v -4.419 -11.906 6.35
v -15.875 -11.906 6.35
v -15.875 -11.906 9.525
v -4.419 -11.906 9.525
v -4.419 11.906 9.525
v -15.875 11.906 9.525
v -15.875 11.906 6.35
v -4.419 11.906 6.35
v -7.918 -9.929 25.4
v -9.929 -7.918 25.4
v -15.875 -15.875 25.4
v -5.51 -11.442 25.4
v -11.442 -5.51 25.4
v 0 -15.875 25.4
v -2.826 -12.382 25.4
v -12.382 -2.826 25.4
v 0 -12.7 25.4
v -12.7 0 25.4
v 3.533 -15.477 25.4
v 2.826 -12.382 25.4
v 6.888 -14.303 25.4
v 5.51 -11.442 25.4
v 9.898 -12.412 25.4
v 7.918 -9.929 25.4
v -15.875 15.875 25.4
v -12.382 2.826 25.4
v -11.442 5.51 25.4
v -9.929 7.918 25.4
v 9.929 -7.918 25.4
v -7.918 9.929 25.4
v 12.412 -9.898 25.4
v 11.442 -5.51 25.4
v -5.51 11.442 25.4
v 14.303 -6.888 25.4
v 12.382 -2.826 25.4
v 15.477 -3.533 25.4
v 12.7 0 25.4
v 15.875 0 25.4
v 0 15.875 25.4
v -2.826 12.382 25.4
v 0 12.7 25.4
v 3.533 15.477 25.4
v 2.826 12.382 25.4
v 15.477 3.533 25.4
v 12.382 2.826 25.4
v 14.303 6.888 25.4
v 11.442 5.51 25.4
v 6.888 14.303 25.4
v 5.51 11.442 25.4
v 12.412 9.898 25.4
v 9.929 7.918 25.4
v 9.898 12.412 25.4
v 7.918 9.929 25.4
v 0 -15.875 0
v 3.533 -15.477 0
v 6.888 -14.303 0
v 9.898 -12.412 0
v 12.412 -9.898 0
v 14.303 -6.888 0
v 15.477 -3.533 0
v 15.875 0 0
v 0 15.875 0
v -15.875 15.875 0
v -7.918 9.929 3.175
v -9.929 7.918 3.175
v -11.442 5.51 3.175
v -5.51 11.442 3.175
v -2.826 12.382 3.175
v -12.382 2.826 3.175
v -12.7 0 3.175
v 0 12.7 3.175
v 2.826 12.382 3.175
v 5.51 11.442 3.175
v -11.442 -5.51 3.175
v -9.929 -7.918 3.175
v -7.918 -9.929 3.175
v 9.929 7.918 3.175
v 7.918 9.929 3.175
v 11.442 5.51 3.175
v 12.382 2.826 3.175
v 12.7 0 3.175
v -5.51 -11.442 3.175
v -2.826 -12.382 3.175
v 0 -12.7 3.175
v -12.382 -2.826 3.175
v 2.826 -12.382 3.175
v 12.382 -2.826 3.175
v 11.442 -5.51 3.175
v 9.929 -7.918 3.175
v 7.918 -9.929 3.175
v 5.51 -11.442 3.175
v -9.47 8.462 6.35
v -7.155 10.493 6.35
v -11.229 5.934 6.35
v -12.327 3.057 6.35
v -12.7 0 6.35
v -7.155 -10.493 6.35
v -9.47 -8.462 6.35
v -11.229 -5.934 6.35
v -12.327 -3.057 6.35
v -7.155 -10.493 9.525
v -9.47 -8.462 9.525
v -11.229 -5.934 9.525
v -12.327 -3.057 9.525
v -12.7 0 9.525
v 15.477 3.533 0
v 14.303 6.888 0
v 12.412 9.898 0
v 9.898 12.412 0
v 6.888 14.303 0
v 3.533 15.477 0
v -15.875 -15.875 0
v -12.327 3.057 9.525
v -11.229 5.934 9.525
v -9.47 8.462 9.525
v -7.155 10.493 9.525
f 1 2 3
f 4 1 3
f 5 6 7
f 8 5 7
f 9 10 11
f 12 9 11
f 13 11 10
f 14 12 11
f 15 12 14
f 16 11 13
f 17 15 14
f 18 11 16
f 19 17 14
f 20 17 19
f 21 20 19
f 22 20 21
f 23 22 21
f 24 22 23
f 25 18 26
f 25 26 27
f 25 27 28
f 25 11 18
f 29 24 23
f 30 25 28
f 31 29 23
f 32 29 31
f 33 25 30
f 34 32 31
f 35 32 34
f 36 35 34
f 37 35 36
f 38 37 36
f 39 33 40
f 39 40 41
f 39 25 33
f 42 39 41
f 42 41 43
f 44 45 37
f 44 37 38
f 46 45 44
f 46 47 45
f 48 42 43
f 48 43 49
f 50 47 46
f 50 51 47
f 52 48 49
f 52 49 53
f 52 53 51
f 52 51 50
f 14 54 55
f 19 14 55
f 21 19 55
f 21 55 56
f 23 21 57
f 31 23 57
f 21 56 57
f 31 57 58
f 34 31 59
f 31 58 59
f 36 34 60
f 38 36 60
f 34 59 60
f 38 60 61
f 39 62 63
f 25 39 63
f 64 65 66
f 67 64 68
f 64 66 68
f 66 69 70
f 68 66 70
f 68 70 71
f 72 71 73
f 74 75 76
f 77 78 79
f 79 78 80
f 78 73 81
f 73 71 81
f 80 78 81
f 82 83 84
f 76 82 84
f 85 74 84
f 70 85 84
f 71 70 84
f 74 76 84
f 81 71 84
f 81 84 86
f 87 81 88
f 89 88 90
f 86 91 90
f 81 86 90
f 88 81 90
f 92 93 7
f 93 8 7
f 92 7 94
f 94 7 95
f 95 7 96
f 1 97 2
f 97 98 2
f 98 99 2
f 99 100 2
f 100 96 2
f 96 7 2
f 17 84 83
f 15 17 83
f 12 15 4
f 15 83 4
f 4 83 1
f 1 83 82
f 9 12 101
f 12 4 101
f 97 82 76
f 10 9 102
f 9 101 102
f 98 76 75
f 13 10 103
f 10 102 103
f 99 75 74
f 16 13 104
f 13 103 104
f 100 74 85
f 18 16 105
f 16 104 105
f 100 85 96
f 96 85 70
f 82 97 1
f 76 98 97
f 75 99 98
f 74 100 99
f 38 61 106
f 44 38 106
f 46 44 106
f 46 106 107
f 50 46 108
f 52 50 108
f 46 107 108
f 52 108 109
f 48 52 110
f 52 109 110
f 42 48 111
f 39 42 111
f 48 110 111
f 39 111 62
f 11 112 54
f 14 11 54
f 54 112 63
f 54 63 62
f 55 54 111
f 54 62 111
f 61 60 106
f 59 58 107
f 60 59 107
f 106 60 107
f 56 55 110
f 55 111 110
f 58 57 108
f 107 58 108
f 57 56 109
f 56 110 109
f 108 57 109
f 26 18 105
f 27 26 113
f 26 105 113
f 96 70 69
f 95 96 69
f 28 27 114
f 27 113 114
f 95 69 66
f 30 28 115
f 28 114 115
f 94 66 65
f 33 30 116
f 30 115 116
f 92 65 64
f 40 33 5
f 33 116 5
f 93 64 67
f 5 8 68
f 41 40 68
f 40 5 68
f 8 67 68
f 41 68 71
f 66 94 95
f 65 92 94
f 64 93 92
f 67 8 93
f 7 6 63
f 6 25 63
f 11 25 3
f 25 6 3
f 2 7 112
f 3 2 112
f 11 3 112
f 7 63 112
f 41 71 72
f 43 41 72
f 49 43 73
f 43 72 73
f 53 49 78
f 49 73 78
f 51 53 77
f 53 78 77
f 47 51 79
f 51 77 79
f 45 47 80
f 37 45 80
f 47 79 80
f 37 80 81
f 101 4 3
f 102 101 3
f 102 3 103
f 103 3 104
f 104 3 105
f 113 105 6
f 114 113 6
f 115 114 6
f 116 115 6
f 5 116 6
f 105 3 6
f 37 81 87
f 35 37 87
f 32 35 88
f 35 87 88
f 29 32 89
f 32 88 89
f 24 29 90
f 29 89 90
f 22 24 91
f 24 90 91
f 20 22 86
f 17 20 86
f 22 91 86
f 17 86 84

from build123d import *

# Parameters (mm, degrees)
F1_DEPTH = 25.4
F2_R     = 12.7
F3_DEPTH = 3.175
F5_DEPTH = 12.7


with BuildPart() as f1:
    # F0 (on Top) → F1 (new body)
    with BuildSketch(Plane.XY):
        with BuildLine():
            ThreePointArc((-15.875, 0), (-11.2253201513, 11.2253201513), (0, 15.875))
            Line((0, 15.875), (-15.875, 15.875))
            Line((-15.875, 15.875), (-15.875, 0))
        make_face()
        with BuildLine():
            Line((-15.875, -15.875), (0, -15.875))
            ThreePointArc((0, -15.875), (-11.2253201513, -11.2253201513), (-15.875, 0))
            Line((-15.875, 0), (-15.875, -15.875))
        make_face()
        with BuildLine():
            Line((0, -15.875), (0, -12.7))
            ThreePointArc((0, -12.7), (-8.9802561211, -8.9802561211), (-12.7, 0))
            Line((-12.7, 0), (-15.875, 0))
            ThreePointArc((-15.875, 0), (-11.2253201513, -11.2253201513), (0, -15.875))
        make_face()
        with BuildLine():
            ThreePointArc((-12.7, 0), (-8.9802561211, 8.9802561211), (0, 12.7))
            Line((0, 12.7), (0, 15.875))
            ThreePointArc((0, 15.875), (-11.2253201513, 11.2253201513), (-15.875, 0))
            Line((-15.875, 0), (-12.7, 0))
        make_face()
        with BuildLine():
            ThreePointArc((0, 12.7), (8.9802561211, 8.9802561211), (12.7, 0))
            ThreePointArc((12.7, 0), (8.9802561211, -8.9802561211), (0, -12.7))
            Line((0, -12.7), (0, -15.875))
            ThreePointArc((0, -15.875), (11.2253201513, -11.2253201513), (15.875, 0))
            ThreePointArc((15.875, 0), (11.2253201513, 11.2253201513), (0, 15.875))
            Line((0, 15.875), (0, 12.7))
        make_face()
    extrude(amount=F1_DEPTH)

    # F2 (on face) → F3 (join)
    with BuildSketch(Plane(origin=(0, 0, 0), x_dir=(1, 0, 0), z_dir=(0, 0, -1))):
        with BuildLine():
            Line((-15.875, 15.875), (-15.875, -15.875))
            Line((-15.875, -15.875), (0, -15.875))
            ThreePointArc((0, -15.875), (15.875, 0), (0, 15.875))
            Line((0, 15.875), (-15.875, 15.875))
        make_face()
        Circle(F2_R, mode=Mode.SUBTRACT)
        Circle(F2_R)
    extrude(amount=-F3_DEPTH)

    # F4 (on face) → F5 (cut)
    with BuildSketch(Plane(origin=(-15.875, 0, 0), x_dir=(0, -1, 0), z_dir=(-1, 0, 0))):
        Polygon((0, 6.35), (0, 9.525), (-7.9375, 9.525), (-11.90625, 9.525), (-11.90625, 6.35), (-7.9375, 6.35), align=None)
        Polygon((7.9375, 9.525), (0, 9.525), (0, 6.35), (7.9375, 6.35), (11.90625, 6.35), (11.90625, 9.525), align=None)
    extrude(amount=-F5_DEPTH, mode=Mode.SUBTRACT)


solid = f1.part
